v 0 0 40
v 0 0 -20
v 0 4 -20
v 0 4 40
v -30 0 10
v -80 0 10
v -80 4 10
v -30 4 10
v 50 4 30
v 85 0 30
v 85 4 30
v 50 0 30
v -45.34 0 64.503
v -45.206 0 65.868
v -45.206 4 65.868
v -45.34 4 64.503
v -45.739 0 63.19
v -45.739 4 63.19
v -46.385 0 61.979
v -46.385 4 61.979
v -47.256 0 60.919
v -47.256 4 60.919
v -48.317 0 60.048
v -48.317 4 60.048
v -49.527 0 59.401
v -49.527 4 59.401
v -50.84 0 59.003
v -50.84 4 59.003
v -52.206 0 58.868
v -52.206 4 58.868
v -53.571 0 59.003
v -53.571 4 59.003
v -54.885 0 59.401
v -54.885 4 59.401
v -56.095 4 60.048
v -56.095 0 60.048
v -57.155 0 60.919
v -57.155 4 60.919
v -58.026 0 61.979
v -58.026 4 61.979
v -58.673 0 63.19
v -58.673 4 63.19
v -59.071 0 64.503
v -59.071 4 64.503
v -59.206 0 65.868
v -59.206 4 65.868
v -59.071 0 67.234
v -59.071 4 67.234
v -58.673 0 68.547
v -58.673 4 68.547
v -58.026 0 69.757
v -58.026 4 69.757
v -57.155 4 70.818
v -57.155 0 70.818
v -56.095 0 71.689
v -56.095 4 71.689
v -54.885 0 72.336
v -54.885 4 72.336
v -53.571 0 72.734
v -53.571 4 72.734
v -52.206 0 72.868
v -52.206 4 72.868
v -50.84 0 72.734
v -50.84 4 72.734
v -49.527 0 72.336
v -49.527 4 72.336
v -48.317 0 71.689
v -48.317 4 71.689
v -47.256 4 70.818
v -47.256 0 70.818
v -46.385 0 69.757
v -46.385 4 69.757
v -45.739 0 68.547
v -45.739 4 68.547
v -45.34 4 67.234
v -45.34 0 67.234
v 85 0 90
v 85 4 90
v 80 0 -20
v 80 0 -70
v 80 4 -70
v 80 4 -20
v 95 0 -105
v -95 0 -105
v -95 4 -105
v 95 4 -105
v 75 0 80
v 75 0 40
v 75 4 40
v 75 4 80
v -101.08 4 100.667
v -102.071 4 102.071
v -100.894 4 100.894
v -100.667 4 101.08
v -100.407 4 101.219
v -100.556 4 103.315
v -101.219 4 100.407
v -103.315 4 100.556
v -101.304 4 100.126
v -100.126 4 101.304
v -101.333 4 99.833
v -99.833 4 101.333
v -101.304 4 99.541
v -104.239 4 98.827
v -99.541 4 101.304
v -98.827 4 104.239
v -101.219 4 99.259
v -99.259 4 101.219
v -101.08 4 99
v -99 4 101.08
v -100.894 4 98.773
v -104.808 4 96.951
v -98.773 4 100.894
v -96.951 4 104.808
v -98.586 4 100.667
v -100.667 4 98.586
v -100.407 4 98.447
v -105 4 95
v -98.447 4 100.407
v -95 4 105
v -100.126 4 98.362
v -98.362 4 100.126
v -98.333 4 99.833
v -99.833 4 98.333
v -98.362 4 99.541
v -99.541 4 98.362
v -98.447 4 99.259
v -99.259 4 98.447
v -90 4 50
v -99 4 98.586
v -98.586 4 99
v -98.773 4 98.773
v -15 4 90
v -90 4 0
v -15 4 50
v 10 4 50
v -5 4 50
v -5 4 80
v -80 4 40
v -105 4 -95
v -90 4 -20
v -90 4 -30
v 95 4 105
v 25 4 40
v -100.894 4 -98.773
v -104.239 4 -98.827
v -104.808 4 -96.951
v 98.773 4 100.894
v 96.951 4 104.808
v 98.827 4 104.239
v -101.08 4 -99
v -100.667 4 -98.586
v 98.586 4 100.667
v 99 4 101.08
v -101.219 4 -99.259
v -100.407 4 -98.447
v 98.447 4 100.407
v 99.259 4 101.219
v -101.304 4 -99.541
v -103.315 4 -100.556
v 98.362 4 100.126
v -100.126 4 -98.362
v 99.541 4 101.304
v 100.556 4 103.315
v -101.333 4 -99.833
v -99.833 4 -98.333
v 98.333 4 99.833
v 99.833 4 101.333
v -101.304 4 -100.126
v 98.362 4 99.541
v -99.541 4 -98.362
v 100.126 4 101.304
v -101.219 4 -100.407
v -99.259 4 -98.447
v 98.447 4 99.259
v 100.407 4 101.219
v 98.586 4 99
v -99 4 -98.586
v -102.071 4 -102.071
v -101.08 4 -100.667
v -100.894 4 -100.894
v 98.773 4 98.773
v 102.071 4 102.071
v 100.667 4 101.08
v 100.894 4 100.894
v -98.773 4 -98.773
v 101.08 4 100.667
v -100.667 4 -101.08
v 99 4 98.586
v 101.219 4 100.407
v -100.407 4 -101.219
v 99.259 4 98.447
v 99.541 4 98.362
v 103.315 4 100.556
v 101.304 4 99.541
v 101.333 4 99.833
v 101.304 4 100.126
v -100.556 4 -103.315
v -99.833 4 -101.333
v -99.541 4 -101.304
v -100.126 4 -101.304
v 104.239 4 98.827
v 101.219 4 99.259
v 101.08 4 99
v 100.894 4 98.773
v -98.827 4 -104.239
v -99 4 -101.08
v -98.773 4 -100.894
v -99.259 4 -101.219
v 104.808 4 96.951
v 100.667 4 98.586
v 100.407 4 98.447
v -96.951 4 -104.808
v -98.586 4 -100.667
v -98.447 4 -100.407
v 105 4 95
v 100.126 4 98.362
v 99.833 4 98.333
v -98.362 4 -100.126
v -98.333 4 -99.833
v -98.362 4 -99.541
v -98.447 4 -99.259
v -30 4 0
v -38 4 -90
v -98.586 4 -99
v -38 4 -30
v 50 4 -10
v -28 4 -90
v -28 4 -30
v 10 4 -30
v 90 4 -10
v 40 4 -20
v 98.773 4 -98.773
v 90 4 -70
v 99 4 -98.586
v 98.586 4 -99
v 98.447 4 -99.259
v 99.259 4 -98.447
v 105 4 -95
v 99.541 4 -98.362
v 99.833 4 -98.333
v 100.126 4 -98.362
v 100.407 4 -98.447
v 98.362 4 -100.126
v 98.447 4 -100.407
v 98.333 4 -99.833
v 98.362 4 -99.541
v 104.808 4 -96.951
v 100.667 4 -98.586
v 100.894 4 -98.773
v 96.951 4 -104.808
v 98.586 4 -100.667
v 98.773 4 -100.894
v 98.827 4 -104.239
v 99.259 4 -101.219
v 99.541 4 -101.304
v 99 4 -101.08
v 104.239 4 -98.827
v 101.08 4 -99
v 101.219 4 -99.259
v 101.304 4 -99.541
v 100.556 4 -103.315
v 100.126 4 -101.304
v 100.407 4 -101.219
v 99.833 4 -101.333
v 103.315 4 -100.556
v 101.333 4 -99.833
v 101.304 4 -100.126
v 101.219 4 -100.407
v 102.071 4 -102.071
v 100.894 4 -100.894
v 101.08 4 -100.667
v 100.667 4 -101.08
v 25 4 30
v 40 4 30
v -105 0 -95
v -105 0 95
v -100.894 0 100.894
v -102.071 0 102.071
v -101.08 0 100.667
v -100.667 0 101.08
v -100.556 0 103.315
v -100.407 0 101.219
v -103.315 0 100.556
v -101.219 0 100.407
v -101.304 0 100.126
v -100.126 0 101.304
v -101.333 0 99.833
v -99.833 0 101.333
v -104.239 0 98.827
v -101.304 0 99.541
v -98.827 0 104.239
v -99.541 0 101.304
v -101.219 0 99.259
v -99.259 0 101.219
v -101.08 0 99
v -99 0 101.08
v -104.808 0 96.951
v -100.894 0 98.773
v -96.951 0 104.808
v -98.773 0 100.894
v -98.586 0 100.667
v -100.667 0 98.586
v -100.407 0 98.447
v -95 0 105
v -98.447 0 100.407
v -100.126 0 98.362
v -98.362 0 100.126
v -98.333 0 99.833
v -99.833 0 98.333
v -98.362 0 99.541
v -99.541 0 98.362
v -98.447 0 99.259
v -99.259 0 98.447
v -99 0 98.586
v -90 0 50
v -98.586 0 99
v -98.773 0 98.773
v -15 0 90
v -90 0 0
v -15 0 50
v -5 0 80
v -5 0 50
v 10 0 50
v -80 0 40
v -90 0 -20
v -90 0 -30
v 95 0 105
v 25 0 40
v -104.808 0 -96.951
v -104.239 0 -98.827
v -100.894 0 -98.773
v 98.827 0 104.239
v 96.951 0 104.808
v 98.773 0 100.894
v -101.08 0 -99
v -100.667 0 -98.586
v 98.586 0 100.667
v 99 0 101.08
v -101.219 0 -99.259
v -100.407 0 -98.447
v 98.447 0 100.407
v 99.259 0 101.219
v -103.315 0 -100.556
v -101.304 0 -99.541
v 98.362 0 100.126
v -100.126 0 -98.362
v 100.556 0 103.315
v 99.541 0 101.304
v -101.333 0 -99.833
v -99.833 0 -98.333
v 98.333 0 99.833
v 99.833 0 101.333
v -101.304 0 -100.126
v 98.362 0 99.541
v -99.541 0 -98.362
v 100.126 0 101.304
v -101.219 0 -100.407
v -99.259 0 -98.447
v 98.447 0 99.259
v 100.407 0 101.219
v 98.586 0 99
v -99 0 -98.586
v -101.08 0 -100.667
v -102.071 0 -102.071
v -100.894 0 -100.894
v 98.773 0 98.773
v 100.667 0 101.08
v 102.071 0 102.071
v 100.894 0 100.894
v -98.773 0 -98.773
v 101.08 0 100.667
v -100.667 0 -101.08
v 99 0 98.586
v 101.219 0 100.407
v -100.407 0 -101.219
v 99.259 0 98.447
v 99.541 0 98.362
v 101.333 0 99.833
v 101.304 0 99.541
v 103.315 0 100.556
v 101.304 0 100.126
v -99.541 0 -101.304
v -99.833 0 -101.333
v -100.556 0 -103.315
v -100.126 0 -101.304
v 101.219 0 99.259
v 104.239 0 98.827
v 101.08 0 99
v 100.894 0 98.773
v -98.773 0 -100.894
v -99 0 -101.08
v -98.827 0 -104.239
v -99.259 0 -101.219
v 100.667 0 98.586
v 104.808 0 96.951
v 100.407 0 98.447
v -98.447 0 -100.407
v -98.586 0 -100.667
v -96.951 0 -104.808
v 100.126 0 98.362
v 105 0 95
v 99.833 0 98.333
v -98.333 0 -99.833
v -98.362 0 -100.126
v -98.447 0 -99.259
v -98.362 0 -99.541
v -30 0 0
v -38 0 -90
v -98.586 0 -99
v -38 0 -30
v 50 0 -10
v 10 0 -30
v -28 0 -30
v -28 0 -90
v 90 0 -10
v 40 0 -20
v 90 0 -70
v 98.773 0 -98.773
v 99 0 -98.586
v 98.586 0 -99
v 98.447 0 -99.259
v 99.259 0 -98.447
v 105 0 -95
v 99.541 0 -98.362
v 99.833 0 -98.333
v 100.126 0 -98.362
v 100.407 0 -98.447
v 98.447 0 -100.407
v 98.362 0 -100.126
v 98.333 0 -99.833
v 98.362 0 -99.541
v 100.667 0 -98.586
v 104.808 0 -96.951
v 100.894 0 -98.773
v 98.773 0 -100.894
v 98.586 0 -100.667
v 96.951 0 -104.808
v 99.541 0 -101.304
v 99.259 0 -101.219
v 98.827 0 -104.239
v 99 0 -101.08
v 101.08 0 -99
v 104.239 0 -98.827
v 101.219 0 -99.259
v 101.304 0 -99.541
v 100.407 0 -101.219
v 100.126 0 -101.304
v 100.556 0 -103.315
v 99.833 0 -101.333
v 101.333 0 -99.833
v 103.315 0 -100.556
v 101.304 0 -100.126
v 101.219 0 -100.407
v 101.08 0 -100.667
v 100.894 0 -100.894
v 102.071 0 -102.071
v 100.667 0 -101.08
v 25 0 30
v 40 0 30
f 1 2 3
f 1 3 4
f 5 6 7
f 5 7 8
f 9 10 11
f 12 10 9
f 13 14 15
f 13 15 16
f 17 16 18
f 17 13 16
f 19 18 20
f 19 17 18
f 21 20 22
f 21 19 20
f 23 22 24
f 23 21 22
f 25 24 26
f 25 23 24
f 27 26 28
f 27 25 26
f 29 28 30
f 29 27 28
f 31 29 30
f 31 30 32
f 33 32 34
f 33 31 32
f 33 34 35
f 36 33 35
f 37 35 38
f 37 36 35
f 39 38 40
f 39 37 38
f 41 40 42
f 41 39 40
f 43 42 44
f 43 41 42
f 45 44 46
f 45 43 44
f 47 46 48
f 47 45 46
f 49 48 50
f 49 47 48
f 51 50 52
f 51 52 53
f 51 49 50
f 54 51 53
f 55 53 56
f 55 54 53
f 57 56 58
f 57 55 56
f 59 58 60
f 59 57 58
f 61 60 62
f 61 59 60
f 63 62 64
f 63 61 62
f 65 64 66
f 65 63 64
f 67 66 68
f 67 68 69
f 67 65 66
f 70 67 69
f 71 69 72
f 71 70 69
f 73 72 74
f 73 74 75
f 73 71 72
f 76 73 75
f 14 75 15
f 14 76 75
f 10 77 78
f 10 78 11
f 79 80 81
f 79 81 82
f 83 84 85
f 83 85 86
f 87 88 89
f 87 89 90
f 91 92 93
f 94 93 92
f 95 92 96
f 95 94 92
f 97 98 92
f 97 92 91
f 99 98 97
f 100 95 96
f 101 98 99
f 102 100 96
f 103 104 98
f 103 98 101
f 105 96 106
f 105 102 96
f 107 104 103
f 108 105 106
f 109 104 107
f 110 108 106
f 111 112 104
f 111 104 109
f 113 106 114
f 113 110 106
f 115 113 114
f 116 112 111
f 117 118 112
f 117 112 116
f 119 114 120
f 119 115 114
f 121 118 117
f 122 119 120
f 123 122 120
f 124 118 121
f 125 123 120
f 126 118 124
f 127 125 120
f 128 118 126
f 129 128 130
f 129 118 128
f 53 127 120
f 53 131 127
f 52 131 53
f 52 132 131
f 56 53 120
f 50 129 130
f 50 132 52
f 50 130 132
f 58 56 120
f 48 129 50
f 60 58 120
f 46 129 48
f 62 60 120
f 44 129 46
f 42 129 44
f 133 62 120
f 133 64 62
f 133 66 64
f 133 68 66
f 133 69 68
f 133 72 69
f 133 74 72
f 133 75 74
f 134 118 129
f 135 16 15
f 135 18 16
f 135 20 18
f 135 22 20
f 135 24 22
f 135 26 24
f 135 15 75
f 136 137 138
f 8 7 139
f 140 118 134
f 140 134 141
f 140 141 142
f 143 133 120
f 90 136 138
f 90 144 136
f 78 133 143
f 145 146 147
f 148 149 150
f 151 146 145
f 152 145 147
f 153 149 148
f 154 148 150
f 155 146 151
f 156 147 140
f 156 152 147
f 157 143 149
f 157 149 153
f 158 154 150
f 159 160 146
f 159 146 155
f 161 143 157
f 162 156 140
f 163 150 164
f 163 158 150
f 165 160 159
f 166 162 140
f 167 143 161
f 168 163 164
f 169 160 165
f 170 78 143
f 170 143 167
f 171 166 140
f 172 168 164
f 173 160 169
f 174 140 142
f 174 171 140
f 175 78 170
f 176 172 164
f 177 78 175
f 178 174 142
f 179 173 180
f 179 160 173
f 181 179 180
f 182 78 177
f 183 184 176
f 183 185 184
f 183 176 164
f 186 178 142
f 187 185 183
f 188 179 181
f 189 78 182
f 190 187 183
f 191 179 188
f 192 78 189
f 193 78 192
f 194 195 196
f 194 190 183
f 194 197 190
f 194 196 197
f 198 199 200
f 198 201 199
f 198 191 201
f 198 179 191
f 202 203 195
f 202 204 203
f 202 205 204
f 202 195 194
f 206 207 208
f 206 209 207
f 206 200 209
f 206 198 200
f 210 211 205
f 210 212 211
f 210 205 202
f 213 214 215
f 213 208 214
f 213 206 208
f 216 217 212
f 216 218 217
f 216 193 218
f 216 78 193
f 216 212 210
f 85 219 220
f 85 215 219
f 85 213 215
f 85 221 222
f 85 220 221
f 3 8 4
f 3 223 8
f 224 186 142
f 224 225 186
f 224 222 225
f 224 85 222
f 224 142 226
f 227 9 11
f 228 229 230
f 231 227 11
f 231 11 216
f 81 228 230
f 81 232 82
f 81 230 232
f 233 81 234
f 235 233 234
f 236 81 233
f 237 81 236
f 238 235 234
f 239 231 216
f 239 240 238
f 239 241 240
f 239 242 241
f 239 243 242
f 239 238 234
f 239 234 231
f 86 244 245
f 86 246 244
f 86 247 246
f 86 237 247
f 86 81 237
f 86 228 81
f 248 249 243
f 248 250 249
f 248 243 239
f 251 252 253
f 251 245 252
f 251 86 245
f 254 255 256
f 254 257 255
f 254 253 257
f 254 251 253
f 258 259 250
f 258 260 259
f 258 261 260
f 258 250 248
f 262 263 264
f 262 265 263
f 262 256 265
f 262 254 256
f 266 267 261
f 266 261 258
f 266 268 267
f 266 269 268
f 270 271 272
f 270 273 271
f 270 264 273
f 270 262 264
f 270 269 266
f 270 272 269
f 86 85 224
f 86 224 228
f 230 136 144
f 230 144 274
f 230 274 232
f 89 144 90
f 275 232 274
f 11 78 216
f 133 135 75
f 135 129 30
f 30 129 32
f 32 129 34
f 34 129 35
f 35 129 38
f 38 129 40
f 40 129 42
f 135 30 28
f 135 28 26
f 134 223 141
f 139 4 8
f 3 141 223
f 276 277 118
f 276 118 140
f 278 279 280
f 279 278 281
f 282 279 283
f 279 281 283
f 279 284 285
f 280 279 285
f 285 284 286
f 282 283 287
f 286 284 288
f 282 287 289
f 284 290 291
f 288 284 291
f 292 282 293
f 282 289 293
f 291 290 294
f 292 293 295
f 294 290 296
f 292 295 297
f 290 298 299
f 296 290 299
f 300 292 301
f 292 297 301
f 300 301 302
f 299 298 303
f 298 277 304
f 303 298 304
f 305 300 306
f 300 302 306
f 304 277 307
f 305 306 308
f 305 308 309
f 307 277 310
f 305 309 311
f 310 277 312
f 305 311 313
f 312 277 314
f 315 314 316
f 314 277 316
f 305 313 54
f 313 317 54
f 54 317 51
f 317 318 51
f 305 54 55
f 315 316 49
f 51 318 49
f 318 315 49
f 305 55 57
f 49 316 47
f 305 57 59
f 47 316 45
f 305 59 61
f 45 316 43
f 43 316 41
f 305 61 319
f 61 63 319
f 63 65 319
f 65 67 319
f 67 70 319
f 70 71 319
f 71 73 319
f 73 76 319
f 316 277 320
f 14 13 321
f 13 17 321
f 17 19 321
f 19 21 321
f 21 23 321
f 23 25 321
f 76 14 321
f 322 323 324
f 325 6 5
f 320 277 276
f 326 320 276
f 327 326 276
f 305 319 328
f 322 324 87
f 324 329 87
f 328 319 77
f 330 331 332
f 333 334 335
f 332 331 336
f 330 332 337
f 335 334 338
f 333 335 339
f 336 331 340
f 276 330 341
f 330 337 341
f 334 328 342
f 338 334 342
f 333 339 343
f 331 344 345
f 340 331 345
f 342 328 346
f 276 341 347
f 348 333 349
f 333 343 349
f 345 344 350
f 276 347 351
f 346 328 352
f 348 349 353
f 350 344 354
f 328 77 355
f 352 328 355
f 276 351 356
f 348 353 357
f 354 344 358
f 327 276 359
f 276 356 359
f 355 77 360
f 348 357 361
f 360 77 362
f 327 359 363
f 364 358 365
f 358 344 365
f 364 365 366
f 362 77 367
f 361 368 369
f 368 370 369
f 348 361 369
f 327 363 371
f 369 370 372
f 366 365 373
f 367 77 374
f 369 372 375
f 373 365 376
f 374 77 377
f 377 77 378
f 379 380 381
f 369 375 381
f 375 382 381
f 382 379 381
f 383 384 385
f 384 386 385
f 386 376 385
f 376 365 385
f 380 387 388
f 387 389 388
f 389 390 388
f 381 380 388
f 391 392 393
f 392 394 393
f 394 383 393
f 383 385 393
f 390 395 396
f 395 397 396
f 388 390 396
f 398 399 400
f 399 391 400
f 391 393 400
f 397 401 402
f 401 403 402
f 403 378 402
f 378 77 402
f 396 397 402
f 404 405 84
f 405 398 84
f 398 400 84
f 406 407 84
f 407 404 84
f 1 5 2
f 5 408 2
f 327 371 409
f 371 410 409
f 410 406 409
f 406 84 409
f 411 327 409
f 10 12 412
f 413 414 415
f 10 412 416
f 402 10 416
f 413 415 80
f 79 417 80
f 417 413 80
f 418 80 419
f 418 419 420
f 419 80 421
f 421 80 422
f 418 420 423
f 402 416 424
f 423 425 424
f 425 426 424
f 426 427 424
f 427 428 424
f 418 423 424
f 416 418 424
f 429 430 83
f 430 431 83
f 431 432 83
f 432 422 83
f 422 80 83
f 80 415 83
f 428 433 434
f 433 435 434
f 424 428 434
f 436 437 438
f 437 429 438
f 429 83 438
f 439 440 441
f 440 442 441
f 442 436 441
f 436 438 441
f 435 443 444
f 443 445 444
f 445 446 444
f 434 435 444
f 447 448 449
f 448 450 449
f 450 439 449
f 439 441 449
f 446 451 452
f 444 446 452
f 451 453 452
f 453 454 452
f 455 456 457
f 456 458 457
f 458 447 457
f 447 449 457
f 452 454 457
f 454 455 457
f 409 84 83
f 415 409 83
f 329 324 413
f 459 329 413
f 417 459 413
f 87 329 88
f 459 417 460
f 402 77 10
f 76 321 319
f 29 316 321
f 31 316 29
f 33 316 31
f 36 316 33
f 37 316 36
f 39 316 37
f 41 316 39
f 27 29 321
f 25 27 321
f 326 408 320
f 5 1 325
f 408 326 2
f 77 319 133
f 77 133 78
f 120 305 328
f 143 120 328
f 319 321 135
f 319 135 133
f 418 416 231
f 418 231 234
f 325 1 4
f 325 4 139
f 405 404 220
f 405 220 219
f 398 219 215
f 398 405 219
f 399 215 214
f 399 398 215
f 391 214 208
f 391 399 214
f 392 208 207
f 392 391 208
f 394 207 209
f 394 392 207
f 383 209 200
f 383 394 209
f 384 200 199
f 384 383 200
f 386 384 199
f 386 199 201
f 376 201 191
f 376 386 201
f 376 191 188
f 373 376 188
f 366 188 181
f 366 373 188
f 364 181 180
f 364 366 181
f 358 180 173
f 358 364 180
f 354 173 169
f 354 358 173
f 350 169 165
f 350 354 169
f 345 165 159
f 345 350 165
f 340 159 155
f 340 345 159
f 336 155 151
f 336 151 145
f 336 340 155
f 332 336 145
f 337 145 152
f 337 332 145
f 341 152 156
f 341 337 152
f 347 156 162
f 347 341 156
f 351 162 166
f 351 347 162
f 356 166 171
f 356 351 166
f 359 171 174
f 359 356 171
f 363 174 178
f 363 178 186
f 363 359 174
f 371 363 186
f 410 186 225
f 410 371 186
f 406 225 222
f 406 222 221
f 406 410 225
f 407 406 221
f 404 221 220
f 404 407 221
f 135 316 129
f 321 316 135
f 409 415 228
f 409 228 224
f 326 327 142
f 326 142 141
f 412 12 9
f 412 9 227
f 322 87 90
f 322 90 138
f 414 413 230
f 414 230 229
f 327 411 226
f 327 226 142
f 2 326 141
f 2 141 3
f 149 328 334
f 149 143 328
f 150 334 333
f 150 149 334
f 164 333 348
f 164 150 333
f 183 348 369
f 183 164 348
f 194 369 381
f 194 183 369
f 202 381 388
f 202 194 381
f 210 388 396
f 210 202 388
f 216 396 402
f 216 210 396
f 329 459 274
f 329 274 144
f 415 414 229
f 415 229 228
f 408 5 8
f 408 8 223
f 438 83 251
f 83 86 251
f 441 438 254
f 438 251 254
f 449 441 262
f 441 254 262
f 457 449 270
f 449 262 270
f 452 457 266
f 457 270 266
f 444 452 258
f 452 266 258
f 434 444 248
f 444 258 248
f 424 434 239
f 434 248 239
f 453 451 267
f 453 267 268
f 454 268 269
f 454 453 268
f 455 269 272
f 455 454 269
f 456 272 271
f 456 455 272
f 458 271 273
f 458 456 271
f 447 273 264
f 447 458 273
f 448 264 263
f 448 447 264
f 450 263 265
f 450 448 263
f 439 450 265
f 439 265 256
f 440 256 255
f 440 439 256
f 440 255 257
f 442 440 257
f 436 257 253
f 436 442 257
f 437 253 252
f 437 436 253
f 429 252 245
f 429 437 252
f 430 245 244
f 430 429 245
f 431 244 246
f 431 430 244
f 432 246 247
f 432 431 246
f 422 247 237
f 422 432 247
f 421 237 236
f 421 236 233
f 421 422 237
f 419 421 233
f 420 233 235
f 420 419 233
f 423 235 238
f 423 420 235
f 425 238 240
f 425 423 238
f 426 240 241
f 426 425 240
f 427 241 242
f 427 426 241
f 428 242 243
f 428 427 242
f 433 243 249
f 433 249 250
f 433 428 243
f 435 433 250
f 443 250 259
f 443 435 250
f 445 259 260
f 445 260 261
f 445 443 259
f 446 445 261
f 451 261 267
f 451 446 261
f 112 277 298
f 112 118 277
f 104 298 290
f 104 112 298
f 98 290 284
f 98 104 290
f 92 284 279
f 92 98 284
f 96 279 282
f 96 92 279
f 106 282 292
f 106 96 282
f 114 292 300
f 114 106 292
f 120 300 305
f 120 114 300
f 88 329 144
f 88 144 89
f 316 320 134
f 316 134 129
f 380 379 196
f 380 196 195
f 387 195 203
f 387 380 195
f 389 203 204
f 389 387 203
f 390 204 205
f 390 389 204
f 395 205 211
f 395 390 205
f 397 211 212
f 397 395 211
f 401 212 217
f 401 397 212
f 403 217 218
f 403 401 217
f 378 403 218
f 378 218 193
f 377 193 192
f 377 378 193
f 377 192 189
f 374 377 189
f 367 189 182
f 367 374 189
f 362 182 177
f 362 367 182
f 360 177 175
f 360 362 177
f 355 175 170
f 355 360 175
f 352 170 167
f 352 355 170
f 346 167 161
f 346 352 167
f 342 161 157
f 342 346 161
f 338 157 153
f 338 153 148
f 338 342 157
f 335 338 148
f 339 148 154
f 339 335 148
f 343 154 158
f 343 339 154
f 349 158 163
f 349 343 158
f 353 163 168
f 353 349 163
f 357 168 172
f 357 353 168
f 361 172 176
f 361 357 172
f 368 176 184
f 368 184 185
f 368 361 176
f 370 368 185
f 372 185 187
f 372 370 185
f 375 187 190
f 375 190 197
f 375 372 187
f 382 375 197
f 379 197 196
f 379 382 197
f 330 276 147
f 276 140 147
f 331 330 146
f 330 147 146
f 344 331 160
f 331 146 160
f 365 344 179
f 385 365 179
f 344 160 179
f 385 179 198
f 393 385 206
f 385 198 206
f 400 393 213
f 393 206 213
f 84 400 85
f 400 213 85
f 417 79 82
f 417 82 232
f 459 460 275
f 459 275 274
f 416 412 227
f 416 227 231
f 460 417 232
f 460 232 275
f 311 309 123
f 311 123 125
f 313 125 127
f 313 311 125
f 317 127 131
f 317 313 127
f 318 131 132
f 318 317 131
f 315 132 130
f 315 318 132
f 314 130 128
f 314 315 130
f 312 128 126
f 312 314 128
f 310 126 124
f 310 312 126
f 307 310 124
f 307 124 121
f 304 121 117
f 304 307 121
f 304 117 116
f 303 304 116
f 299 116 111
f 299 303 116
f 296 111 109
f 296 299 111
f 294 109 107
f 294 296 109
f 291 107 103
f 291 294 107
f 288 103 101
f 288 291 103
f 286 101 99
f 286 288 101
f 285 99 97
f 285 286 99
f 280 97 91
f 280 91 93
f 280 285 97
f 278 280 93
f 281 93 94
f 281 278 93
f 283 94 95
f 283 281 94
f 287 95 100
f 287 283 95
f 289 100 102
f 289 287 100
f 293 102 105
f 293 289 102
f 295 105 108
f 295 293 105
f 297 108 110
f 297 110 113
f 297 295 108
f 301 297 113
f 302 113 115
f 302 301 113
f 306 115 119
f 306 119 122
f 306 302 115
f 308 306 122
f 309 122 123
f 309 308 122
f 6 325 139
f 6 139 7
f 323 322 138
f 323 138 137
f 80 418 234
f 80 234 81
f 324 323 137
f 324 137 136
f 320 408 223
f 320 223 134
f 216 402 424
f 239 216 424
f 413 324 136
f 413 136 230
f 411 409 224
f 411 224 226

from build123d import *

# Parameters (mm, degrees)
SKETCH1_W         = 210
SKETCH1_H         = 210
MAINEXTRUDE_DEPTH = 4
SKETCH1_6_R       = 1.5
SCREWHOLES_DEPTH  = 4
ROUNDEDCORNERS_R  = 10
SKETCH3_R         = 7
TRENCH_DEPTH      = 4


with BuildPart() as part:
    # Sketch1 → MainExtrude (new body)
    with BuildSketch(Plane(origin=(0, 0, 0), x_dir=(1, 0, 0), z_dir=(0, 1, 0))):
        Rectangle(SKETCH1_W, SKETCH1_H)
    extrude(amount=MAINEXTRUDE_DEPTH)

    # Sketch1<6> → ScrewHoles (cut)
    with BuildSketch(Plane(origin=(0, 0, 0), x_dir=(1, 0, 0), z_dir=(0, 1, 0))):
        with Locations((-99.833273811, 99.833273811)):
            Circle(SKETCH1_6_R)
        with Locations((-99.833273811, -99.833273811)):
            Circle(SKETCH1_6_R)
        with Locations((99.833273811, -99.833273811)):
            Circle(SKETCH1_6_R)
        with Locations((99.833273811, 99.833273811)):
            Circle(SKETCH1_6_R)
    extrude(amount=SCREWHOLES_DEPTH, mode=Mode.SUBTRACT)

    # RoundedCorners
    roundedcorners_edges = [part.edges().sort_by_distance(p)[0] for p in [
        (-105, 2, -105),
        (-105, 2, 105),
        (105, 2, 105),
        (105, 2, -105),
    ]]
    fillet(roundedcorners_edges, radius=ROUNDEDCORNERS_R)

    # Sketch3 → Trench (cut)
    with BuildSketch(Plane(origin=(0, 0, 0), x_dir=(1, 0, 0), z_dir=(0, 1, 0))):
        with Locations((-52.205723714, -65.868416485)):
            Circle(SKETCH3_R)
        Polygon((-38, 90), (-38, 30), (-90, 30), (-90, 20), (0, 20), (0, -40), (-80, -40), (-80, -10), (-30, -10), (-30, 0), (-90, 0), (-90, -50), (-15, -50), (-15, -90), (85, -90), (85, -30), (50, -30), (50, 10), (90, 10), (90, 70), (80, 70), (80, 20), (40, 20), (40, -30), (25, -30), (25, -40), (75, -40), (75, -80), (-5, -80), (-5, -50), (10, -50), (10, 30), (-28, 30), (-28, 90), align=None)
    extrude(amount=TRENCH_DEPTH, mode=Mode.SUBTRACT)


solid = part.part
